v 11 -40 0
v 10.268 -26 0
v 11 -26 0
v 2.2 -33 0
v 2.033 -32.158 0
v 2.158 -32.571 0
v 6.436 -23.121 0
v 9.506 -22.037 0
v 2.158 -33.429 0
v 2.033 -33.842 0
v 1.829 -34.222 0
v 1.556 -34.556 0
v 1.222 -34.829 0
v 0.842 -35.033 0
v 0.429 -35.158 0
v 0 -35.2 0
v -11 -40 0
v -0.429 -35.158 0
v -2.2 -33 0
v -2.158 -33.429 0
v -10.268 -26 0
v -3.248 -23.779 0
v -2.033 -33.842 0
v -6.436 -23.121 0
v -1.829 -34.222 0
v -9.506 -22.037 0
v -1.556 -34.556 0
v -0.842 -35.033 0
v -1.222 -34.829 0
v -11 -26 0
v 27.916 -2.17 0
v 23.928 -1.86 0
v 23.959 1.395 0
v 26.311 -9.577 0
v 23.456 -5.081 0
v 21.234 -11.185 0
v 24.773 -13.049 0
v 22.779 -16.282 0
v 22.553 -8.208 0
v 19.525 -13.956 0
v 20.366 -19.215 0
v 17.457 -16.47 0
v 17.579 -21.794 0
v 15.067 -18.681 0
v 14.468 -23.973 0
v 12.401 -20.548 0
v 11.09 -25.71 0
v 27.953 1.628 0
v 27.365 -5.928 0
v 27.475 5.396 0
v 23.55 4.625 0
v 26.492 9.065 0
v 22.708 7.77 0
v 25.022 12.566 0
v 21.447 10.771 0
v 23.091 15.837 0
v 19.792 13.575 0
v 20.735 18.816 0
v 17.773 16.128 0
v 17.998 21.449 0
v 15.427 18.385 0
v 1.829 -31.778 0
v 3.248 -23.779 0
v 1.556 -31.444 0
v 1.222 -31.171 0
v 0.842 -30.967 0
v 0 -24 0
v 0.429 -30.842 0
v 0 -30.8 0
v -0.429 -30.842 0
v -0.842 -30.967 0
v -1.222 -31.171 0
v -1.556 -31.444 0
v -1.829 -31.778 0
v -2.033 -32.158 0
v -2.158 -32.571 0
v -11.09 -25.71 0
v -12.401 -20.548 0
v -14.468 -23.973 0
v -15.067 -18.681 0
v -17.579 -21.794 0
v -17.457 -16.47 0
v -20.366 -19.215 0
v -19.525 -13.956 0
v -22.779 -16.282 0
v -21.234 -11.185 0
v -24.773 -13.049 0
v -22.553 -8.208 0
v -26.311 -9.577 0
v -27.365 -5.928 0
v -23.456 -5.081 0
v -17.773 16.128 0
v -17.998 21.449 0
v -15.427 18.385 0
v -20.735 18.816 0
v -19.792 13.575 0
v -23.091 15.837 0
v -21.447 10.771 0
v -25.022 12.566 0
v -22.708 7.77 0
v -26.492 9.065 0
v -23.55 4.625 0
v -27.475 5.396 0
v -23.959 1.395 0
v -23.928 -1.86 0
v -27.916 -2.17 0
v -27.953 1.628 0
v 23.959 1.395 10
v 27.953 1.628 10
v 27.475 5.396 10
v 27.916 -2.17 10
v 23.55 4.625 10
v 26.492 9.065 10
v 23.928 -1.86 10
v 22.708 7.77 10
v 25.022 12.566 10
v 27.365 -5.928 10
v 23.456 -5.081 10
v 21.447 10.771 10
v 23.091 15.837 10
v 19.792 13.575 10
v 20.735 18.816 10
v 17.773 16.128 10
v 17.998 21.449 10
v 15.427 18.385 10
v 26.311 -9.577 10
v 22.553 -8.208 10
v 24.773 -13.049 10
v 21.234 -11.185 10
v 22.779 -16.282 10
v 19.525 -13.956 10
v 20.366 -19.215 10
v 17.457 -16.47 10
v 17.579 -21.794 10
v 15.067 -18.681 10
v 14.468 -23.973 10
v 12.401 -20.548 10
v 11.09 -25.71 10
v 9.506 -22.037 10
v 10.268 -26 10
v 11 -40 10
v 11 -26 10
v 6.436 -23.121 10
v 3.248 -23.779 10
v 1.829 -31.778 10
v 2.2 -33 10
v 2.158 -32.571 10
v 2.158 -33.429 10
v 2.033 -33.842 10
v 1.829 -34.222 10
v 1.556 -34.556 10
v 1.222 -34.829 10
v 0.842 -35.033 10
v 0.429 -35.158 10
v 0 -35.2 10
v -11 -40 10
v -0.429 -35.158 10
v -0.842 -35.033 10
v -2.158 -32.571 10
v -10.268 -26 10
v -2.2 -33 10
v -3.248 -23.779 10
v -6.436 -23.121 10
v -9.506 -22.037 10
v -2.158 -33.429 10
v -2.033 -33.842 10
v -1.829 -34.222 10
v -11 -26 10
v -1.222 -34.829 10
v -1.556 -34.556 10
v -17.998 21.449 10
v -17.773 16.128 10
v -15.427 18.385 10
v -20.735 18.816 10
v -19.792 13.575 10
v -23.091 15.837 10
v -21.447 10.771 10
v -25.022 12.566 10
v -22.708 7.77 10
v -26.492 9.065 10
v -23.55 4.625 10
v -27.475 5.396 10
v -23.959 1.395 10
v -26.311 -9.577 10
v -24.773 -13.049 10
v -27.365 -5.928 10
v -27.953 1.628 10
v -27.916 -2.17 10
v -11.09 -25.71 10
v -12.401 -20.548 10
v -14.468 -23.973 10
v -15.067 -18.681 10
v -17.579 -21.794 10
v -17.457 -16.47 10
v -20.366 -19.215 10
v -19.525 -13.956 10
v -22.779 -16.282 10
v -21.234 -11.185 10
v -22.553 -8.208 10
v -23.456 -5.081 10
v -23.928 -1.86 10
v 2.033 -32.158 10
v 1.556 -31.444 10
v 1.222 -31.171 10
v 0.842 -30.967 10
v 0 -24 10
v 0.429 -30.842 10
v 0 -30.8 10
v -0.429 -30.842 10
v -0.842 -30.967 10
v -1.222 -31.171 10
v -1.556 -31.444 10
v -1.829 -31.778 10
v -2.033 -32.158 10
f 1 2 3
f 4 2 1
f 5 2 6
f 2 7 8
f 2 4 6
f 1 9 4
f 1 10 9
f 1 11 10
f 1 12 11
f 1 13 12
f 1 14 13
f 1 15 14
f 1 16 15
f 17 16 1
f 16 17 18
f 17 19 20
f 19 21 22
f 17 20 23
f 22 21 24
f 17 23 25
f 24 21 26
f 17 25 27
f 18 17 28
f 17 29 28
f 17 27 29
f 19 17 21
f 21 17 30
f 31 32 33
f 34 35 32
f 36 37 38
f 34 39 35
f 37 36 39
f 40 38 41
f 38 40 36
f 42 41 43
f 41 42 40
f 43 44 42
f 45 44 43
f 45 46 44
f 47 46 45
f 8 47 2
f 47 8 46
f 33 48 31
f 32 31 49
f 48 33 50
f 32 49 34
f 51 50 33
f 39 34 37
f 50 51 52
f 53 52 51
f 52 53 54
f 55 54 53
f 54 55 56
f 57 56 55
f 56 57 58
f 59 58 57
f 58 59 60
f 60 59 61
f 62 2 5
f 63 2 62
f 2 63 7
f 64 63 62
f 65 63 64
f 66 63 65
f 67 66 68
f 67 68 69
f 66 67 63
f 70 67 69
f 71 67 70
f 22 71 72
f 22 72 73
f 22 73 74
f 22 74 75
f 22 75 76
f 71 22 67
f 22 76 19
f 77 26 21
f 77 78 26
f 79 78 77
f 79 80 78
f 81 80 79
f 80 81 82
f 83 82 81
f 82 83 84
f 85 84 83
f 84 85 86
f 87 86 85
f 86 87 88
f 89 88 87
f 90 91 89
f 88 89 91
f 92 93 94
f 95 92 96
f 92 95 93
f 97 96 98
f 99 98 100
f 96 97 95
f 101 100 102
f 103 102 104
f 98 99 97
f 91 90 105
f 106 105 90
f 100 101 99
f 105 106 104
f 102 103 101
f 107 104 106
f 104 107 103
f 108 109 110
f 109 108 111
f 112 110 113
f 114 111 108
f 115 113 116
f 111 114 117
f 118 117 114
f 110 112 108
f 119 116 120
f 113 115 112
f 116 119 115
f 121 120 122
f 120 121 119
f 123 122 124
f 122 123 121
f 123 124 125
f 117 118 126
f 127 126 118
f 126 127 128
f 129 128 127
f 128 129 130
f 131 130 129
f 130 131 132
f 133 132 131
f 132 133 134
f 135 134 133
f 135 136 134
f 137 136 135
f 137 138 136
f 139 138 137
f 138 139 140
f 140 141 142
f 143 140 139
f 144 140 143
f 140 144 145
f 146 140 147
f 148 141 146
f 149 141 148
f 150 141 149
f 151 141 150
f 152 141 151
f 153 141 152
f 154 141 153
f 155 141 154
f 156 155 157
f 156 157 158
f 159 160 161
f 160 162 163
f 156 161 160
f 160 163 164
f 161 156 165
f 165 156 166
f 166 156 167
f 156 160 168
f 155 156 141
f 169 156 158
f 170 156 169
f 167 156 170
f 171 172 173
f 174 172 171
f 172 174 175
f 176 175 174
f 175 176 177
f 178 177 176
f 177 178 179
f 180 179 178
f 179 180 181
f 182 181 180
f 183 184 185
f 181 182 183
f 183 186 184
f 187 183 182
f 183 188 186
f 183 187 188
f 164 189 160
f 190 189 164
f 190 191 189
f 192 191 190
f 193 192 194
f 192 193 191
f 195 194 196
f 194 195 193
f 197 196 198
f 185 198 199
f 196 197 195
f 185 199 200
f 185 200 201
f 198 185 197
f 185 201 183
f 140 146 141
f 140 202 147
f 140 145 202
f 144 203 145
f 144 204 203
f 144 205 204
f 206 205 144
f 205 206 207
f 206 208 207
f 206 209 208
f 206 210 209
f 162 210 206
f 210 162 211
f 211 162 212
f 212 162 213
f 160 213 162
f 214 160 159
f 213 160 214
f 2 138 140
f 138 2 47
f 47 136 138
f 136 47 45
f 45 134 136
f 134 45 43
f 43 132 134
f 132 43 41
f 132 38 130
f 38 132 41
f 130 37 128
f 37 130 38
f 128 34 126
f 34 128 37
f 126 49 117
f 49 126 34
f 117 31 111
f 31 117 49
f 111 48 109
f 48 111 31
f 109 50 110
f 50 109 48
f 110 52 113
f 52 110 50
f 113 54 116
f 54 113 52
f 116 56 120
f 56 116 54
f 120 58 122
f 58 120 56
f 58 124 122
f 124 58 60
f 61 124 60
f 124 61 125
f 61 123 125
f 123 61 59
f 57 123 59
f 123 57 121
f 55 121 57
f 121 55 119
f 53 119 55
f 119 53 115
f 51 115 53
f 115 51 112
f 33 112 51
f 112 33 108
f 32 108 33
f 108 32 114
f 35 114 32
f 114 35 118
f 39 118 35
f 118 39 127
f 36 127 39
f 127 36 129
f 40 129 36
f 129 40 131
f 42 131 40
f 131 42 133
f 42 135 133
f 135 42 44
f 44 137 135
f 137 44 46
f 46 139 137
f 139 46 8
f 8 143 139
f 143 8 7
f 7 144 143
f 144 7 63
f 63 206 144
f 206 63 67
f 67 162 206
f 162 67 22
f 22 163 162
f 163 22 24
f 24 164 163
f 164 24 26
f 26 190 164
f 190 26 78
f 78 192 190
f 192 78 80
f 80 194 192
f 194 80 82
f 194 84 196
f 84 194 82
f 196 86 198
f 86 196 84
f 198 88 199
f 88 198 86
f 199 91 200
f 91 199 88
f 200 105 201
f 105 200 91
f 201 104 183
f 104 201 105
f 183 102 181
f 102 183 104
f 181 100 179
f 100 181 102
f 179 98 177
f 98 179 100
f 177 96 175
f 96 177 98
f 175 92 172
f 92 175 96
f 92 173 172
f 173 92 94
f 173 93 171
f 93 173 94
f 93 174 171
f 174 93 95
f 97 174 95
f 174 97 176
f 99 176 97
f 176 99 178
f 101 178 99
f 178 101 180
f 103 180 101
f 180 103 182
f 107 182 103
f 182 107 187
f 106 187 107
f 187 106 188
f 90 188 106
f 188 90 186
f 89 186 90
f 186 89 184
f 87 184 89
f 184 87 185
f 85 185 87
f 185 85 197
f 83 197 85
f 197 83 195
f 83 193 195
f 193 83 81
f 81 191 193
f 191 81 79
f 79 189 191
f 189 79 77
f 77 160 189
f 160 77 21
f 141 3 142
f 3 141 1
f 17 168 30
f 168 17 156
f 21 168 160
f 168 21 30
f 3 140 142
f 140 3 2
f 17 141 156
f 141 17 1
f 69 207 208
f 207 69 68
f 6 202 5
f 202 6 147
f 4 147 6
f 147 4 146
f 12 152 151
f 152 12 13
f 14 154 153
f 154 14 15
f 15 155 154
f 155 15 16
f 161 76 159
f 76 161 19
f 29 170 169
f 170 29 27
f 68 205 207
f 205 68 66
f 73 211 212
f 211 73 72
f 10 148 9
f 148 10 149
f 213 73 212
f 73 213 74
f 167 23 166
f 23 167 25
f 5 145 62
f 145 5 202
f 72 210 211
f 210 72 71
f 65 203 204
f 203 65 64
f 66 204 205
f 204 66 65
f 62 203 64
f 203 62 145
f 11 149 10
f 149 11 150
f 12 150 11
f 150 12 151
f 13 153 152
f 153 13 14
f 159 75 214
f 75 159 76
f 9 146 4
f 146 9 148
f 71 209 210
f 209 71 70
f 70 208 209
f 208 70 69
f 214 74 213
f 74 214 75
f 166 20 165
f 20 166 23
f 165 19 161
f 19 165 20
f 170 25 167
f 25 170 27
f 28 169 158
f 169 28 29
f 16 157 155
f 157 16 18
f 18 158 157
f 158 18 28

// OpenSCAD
$fn = 32;

// ----------------------------------------------------------------------
// Spring clip: 56 mm outside, 4 mm band, 80 degree opening
// ----------------------------------------------------------------------

// --- parameters (mm) ---
outer_r = 28;             // clip outside radius
inner_r = 24;             // clip bore radius
band = 4;                 // band thickness
clip_w = 10;              // clip width
opening = 80;             // opening angle
tab_w = 22;               // tab width
tab_len = 12;             // tab length past the clip
tab_hole = 4.4;           // tab fixing hole

clip_profile = [[-17.998, 21.449], [-20.735, 18.816], [-23.091, 15.837], [-25.022, 12.566], [-26.492, 9.065], [-27.475, 5.396], [-27.953, 1.628], [-27.916, -2.17], [-27.365, -5.928], [-26.311, -9.577], [-24.773, -13.049], [-22.779, -16.282], [-20.366, -19.215], [-17.579, -21.794], [-14.468, -23.973], [-11.09, -25.71], [-7.509, -26.974], [-3.789, -27.742], [0, -28], [3.789, -27.742], [7.509, -26.974], [11.09, -25.71], [14.468, -23.973], [17.579, -21.794], [20.366, -19.215], [22.779, -16.282], [24.773, -13.049], [26.311, -9.577], [27.365, -5.928], [27.916, -2.17], [27.953, 1.628], [27.475, 5.396], [26.492, 9.065], [25.022, 12.566], [23.091, 15.837], [20.735, 18.816], [17.998, 21.449], [15.427, 18.385], [17.773, 16.128], [19.792, 13.575], [21.447, 10.771], [22.708, 7.77], [23.55, 4.625], [23.959, 1.395], [23.928, -1.86], [23.456, -5.081], [22.553, -8.208], [21.234, -11.185], [19.525, -13.956], [17.457, -16.47], [15.067, -18.681], [12.401, -20.548], [9.506, -22.037], [6.436, -23.121], [3.248, -23.779], [0, -24], [-3.248, -23.779], [-6.436, -23.121], [-9.506, -22.037], [-12.401, -20.548], [-15.067, -18.681], [-17.457, -16.47], [-19.525, -13.956], [-21.234, -11.185], [-22.553, -8.208], [-23.456, -5.081], [-23.928, -1.86], [-23.959, 1.395], [-23.55, 4.625], [-22.708, 7.77], [-21.447, 10.771], [-19.792, 13.575], [-17.773, 16.128], [-15.427, 18.385]];

difference() {
  union() {
    linear_extrude(height = clip_w) polygon(clip_profile);
    /* mounting tab, sunk 2 mm into the band */
    translate([-11, -40, 0]) cube([tab_w, 14, clip_w]);
  }
  translate([0, -33, -2.5]) cylinder(h = clip_w + 5, d = tab_hole);
}
